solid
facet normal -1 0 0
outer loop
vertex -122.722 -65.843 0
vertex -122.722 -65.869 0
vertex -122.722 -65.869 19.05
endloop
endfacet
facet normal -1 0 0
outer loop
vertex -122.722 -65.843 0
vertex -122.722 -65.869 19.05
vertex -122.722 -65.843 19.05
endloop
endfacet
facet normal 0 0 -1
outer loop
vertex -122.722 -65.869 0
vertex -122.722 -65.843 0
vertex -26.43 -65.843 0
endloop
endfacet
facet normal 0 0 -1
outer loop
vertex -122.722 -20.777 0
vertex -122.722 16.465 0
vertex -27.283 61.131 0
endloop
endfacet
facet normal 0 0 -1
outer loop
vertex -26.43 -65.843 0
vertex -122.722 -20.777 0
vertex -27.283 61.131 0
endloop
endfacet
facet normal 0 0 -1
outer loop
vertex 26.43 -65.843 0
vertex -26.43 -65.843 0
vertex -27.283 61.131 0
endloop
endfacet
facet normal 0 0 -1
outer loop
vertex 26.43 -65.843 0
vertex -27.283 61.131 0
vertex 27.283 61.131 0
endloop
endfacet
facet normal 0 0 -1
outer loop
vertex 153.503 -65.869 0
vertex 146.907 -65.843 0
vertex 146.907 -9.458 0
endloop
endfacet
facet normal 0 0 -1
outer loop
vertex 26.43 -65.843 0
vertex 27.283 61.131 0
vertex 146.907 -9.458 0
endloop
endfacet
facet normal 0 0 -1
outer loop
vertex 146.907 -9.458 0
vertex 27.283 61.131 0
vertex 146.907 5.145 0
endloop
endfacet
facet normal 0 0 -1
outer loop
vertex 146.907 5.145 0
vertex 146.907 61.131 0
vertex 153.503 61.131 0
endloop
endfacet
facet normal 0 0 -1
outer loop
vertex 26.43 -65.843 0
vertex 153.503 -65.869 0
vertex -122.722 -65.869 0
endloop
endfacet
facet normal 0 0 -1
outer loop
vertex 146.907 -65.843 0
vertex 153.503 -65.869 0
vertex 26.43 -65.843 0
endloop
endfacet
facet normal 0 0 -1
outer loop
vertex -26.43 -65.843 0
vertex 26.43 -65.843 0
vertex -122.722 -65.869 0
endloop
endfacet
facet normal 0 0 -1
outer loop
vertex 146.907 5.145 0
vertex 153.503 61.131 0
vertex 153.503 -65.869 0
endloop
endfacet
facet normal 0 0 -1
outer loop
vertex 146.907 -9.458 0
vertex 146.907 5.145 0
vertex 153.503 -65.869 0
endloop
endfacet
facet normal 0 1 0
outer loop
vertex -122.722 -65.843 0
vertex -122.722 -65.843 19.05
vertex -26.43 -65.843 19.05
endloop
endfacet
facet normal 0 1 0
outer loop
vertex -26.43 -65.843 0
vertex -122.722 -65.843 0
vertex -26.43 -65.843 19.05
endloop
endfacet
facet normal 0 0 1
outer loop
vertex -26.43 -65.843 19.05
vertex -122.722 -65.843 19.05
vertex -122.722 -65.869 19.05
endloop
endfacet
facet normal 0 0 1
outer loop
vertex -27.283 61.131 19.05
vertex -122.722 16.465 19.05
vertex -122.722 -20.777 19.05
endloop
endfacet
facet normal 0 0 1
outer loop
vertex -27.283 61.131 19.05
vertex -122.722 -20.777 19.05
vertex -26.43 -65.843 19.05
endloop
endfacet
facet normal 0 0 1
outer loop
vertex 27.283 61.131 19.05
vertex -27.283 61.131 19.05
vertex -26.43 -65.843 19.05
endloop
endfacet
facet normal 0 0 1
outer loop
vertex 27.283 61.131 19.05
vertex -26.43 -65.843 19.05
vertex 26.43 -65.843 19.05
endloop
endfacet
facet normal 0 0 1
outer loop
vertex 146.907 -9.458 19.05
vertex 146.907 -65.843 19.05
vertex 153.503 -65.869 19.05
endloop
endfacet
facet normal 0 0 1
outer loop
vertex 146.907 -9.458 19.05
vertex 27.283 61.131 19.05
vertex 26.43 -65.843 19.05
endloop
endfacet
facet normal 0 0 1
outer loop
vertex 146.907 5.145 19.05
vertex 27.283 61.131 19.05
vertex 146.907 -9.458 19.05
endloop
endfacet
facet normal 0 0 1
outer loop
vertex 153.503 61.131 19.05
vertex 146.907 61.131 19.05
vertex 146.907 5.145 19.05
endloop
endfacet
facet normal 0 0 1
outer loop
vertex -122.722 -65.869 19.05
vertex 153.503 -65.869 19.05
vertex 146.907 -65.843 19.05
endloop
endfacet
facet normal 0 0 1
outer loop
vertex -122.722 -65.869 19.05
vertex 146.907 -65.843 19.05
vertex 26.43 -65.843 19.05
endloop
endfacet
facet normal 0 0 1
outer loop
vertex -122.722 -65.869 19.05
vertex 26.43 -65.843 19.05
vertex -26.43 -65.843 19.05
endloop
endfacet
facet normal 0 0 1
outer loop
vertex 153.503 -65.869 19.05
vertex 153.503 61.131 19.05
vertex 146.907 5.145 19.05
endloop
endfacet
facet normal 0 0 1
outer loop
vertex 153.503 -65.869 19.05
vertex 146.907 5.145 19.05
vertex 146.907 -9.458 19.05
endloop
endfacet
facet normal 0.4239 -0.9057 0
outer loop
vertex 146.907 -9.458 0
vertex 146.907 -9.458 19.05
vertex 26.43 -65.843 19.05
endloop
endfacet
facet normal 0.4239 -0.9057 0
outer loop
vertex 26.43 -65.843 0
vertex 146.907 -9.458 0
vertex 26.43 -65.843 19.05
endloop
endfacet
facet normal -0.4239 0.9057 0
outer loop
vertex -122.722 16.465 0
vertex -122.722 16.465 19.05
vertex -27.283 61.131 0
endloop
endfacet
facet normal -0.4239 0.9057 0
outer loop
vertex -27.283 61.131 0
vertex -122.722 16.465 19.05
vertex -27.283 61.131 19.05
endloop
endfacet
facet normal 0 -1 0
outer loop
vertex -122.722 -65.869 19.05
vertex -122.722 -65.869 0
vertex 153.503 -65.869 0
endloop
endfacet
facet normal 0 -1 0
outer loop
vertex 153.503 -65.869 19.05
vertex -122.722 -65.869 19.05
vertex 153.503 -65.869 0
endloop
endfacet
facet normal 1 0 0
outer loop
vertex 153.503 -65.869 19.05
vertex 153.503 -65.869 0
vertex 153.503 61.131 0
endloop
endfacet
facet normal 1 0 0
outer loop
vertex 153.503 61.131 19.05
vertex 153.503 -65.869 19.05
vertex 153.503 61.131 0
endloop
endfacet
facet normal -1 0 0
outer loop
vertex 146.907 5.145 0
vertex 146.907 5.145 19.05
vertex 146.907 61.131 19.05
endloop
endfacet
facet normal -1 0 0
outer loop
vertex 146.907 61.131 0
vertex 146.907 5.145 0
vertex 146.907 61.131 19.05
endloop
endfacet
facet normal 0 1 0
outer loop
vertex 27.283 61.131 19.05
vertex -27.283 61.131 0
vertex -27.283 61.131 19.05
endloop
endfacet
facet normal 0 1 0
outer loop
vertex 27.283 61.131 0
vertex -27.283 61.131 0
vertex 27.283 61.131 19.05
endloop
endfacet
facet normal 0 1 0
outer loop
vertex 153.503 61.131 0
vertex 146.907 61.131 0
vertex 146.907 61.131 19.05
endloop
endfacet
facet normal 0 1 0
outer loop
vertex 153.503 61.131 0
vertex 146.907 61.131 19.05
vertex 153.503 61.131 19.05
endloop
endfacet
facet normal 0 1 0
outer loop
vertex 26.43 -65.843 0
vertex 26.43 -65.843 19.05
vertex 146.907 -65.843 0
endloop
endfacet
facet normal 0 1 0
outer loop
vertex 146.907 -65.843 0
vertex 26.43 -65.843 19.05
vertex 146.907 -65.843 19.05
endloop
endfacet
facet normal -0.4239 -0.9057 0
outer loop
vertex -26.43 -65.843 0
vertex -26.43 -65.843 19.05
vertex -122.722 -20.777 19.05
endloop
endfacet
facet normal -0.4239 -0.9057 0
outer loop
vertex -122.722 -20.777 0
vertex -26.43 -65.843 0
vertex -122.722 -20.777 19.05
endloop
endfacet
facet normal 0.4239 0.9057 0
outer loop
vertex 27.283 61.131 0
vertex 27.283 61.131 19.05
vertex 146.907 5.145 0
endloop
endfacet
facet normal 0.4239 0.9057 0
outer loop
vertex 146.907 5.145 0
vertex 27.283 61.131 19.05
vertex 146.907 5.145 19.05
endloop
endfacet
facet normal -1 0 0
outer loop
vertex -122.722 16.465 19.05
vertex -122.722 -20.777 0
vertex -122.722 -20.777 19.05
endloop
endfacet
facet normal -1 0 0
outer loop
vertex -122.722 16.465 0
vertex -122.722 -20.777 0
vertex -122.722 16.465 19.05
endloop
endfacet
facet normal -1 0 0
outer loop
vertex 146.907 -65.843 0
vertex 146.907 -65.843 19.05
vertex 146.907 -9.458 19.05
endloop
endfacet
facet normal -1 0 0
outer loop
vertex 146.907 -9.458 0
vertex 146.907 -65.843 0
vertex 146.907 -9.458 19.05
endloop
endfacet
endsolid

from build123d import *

# Parameters (mm, degrees)
F0_W     = 276.225
F0_H     = 127
F1_DEPTH = 19.05
F4_DEPTH = 25.4


with BuildPart() as f1:
    # F0 (on Top) → F1 (new body)
    with BuildSketch(Plane.XY):
        with Locations((15.390978, -2.369146)):
            Rectangle(F0_W, F0_H)
    extrude(amount=F1_DEPTH)

    # F3 (on face) → F4 (cut)
    with BuildSketch(Plane.XY.offset(19.05)):
        Polygon((-26.429687, 61.530381), (-146.907181, 61.530381), (-146.907181, 5.145296), align=None)
        Polygon((-146.907181, -65.84312), (-26.429687, -65.84312), (-146.907181, -9.458034), align=None)
        Polygon((146.907181, 61.530381), (26.429687, 61.530381), (146.907181, 5.145296), align=None)
        Polygon((26.429687, -65.84312), (146.907181, -65.84312), (146.907181, -9.458034), align=None)
    extrude(amount=-F4_DEPTH, mode=Mode.SUBTRACT)


solid = f1.part
